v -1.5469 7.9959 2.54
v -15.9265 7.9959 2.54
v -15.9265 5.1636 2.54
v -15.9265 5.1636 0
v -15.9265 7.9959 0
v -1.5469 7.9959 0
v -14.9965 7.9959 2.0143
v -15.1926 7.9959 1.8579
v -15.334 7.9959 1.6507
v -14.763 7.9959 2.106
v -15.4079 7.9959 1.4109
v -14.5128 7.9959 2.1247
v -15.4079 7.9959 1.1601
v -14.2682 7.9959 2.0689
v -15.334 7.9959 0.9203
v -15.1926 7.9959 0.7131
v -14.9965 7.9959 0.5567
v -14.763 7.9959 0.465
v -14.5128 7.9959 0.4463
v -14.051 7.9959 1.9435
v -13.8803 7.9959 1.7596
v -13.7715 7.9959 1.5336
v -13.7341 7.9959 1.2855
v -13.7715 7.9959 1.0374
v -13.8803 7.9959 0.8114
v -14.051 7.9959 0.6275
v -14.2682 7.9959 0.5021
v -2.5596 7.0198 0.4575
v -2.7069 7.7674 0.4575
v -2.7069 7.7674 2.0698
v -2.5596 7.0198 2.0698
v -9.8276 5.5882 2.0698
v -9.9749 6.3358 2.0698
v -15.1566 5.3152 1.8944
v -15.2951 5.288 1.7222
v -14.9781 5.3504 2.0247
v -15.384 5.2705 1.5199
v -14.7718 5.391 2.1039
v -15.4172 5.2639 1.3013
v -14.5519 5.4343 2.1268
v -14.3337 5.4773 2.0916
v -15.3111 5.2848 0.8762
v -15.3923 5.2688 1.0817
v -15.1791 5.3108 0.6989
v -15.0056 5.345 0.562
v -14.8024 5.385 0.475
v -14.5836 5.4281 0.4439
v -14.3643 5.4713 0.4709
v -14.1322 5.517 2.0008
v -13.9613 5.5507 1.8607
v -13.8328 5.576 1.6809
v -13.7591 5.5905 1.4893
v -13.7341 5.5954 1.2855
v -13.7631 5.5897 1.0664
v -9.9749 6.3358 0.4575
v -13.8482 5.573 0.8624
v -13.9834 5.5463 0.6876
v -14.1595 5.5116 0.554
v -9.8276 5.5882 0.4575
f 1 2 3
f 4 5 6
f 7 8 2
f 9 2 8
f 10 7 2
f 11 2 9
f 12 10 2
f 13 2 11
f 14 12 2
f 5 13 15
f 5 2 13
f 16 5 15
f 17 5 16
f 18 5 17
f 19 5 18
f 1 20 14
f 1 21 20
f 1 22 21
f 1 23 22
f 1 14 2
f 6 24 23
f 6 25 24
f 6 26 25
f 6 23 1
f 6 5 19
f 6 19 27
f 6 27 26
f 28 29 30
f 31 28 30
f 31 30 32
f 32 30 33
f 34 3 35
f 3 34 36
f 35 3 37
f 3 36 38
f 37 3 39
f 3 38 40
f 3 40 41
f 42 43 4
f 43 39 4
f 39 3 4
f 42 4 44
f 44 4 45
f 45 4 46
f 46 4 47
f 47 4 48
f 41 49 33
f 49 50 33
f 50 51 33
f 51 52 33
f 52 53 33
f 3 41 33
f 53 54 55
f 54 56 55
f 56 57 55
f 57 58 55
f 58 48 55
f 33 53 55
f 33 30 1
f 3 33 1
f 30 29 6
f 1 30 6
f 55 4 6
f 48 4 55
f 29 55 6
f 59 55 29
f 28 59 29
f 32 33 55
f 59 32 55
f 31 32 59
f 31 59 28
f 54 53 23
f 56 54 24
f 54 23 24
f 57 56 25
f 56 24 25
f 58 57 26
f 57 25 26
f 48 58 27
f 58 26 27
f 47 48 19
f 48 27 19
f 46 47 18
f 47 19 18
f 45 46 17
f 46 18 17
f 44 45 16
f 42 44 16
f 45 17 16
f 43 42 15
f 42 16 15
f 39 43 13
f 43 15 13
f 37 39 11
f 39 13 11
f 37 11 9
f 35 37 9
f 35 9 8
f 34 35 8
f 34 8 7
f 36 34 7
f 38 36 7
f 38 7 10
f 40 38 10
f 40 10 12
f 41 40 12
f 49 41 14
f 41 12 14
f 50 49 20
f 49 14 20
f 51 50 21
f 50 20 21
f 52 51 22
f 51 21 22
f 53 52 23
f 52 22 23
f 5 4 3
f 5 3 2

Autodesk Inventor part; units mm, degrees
ref_plane "YZ Plane" through (0, 0, 0) normal (1, 0, 0) x (0, 1, 0)
ref_plane "XZ Plane" through (0, 0, 0) normal (0, 1, 0) x (-1, 0, 0)
ref_plane "XY Plane" through (0, 0, 0) normal (0, 0, 1) x (1, 0, 0)
sketch "Sketch1" plane through (0, 0, 0) normal (0, 0, 1) x (1, 0, 0)
  line L0 (-15.9265, 7.9959) -> (-1.5469, 7.9959)
  line L1 (-15.9265, 5.1636) -> (-15.9265, 7.9959)
  line L2 (-15.9265, 5.1636) -> (-1.5469, 7.9959)
  point P0 (0, 0)
extrude "Extrusion1" add sketch "Sketch1" along normal blind 2.54
sketch "Sketch2" plane through (-1.5469, 7.9959, 0) normal (0.1932565, -0.9811483, 0) x (0.9811483, 0.1932565, 0)
  line L0 (-1.1823, 2.0698) -> (-8.5899, 2.0698)
  line L1 (-8.5899, 2.0698) -> (-8.5899, 0.4575)
  line L2 (-8.5899, 0.4575) -> (-1.1823, 0.4575)
  line L3 (-1.1823, 0.4575) -> (-1.1823, 2.0698)
  point P0 (-0.0275, 0)
extrude "Extrusion2" add sketch "Sketch2" along normal blind 0.762
sketch "Sketch3" plane through (-15.9265, 7.9959, 0) normal (0, 1, 0) x (1, 0, 0)
  circle A0 centre (1.3508, -1.2855) radius 0.8416
  point P0 (15.9265, 0)
extrude "Extrusion3" cut sketch "Sketch3" against normal blind 12.7
properties part number "GRIPPER2"
